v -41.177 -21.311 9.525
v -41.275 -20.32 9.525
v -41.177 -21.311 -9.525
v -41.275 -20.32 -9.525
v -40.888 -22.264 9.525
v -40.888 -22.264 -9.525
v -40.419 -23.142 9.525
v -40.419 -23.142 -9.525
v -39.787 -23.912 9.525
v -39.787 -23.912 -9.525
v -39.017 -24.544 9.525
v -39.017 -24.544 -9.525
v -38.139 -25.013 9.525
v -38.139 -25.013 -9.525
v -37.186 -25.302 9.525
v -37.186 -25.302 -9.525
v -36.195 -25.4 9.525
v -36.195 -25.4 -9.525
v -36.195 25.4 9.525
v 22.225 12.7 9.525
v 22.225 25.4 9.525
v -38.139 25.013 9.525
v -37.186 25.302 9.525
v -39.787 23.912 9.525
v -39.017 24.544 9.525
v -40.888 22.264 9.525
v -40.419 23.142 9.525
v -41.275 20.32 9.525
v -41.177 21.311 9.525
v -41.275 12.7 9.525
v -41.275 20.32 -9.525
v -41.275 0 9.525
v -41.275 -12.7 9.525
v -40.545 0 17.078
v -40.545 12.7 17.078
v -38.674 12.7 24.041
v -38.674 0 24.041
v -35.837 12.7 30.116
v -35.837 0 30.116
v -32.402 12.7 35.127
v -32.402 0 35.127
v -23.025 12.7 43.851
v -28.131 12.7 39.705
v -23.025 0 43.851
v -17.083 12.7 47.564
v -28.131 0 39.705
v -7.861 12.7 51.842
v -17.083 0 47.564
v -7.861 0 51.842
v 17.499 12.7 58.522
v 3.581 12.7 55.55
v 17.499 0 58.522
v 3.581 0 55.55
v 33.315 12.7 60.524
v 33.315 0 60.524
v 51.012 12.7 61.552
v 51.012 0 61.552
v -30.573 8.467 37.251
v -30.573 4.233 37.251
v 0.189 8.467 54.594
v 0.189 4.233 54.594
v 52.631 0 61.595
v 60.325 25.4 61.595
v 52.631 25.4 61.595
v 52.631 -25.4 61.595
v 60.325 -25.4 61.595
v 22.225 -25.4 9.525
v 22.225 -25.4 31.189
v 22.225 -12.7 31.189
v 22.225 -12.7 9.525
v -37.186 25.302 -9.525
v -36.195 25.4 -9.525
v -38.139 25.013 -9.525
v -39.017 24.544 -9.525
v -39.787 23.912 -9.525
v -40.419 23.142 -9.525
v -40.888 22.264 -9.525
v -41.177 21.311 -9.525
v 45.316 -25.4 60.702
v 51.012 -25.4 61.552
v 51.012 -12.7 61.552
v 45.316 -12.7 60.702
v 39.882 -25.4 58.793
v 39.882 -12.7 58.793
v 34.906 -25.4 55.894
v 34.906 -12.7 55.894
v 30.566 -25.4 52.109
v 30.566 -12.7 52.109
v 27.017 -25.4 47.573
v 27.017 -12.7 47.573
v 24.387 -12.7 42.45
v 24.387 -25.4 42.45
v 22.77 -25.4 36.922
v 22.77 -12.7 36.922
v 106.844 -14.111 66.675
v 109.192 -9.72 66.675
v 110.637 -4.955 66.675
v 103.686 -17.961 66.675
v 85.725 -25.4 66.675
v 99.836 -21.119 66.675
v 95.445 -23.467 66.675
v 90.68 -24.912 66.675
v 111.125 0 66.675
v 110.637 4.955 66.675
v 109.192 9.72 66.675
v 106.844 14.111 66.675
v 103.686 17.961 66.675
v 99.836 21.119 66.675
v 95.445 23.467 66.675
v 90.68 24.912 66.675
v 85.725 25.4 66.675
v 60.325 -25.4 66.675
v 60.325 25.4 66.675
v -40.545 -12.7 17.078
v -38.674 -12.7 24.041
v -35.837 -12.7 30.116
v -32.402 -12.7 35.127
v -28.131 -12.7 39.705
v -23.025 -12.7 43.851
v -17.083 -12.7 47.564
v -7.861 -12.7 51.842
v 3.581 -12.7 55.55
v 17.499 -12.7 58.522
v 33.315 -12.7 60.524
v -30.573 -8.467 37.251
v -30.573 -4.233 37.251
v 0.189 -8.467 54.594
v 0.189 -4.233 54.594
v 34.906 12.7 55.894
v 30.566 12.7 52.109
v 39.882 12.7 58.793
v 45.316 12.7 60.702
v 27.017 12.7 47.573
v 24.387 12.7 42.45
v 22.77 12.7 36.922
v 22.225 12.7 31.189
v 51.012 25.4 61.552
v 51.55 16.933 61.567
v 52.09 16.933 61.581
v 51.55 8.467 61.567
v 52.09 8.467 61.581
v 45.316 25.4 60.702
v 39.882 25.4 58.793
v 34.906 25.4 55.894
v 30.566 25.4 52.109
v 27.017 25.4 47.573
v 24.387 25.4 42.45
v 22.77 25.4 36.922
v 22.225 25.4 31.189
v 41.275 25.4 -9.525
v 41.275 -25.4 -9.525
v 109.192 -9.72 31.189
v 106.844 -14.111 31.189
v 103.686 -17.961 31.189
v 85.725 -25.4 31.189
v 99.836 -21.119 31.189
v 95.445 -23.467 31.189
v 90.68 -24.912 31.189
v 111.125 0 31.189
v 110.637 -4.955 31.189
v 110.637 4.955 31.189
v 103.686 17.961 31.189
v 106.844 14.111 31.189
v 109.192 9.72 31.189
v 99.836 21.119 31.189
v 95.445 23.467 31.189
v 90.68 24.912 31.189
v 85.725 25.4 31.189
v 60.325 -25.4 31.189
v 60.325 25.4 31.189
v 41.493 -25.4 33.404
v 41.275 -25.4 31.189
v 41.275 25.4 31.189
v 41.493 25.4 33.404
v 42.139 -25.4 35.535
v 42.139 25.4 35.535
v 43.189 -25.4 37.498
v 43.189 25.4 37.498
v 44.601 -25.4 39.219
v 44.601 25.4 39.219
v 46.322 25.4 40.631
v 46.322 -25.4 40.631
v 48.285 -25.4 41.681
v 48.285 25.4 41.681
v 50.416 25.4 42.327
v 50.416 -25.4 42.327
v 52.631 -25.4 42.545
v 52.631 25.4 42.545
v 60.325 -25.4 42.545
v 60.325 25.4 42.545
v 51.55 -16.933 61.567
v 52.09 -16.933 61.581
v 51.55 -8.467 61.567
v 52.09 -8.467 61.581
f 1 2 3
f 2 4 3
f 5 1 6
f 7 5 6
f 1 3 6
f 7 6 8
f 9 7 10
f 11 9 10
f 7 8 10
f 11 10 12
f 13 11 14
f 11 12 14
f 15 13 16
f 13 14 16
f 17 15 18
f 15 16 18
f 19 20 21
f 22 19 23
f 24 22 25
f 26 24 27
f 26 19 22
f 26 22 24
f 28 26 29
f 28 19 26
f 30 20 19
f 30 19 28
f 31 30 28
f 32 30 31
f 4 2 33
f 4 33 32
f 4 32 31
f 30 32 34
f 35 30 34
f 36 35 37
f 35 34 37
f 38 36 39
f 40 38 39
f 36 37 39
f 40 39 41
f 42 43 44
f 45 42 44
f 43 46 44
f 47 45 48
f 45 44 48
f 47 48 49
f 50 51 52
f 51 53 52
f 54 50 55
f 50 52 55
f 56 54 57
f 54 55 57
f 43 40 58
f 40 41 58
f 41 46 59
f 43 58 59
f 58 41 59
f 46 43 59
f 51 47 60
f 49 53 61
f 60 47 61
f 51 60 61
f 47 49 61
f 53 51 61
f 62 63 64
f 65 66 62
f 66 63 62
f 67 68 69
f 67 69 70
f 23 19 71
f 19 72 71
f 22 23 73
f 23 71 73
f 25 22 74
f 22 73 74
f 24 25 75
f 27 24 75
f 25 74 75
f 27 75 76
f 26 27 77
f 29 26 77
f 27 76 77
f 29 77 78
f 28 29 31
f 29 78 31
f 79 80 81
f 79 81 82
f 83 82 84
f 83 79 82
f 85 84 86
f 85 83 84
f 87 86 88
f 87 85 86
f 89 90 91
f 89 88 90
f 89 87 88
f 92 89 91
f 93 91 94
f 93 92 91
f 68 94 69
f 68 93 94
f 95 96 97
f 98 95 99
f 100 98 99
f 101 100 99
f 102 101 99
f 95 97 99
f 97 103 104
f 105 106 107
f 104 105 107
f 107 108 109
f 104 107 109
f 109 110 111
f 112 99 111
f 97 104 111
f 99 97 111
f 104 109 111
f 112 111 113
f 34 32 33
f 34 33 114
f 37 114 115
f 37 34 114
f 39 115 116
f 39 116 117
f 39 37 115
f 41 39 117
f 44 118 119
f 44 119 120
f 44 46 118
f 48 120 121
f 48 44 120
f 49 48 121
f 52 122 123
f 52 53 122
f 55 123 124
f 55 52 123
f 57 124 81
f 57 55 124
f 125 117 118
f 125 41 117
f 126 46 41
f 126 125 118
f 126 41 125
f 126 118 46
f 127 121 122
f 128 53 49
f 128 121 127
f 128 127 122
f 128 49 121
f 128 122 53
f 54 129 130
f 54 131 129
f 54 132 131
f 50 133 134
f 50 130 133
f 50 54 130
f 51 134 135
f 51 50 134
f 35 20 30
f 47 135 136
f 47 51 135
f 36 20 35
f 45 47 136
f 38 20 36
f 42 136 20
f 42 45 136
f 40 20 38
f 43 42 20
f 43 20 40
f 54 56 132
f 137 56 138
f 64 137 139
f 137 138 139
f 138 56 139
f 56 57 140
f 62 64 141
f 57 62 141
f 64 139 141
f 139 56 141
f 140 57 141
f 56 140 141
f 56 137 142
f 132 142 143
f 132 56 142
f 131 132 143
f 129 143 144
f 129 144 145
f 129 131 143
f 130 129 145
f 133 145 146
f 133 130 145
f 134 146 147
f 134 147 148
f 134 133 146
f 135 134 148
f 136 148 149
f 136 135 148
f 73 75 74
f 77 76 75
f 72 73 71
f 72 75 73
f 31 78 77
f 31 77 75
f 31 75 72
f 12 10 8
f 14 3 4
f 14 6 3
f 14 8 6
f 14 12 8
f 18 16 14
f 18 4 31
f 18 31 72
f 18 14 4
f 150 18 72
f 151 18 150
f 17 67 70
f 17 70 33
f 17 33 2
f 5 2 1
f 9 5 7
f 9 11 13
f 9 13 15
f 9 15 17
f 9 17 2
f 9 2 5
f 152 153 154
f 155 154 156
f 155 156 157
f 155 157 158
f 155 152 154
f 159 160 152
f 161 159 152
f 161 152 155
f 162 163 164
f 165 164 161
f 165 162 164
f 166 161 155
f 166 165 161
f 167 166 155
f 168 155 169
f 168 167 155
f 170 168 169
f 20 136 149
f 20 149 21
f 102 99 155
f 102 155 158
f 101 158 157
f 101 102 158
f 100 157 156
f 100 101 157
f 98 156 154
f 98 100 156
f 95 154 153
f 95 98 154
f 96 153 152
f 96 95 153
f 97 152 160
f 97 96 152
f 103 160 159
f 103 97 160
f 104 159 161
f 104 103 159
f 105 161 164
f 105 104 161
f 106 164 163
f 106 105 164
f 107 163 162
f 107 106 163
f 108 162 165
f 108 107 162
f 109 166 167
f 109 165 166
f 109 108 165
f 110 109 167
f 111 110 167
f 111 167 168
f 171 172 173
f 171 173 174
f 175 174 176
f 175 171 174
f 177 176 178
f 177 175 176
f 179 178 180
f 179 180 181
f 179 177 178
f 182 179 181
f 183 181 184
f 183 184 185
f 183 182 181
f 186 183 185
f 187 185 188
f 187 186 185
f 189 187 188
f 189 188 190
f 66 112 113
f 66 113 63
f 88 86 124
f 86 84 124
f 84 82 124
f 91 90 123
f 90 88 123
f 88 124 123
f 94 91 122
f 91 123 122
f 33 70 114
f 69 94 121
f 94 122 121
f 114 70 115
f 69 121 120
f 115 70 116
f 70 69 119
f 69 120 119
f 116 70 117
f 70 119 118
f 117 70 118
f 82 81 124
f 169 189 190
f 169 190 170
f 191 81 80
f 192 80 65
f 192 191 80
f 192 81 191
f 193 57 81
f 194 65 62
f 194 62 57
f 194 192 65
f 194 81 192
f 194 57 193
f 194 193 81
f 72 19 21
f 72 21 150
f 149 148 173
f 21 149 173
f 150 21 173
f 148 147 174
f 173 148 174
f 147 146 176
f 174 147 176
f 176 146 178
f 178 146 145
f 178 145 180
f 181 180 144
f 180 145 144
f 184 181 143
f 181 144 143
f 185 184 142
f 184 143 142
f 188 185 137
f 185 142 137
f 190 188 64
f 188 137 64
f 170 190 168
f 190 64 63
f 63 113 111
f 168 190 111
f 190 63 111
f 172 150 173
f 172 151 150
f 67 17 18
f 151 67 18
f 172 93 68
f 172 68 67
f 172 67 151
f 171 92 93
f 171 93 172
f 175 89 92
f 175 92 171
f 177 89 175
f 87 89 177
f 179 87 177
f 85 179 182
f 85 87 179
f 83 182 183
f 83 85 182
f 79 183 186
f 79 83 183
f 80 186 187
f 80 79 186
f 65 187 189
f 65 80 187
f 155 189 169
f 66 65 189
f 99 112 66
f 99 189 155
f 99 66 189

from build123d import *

# Parameters (mm, degrees)
F1_DEPTH = 25.4
F2_DEPTH = 25.4
F3_DEPTH = 12.7
F0_W     = 25.4
F0_H     = 35.486
F5_R     = 5.08


with BuildPart() as f1:
    # F0 (on Front) → F1 (new body, symmetric)
    with BuildSketch(Plane.XZ):
        Polygon((-41.275, -9.525), (41.275, -9.525), (41.275, 9.525), (22.225, 9.525), (-41.275, 9.525), align=None)
    extrude(amount=F1_DEPTH, both=True)

    # F0 (on Front) → F2 (join, symmetric)
    with BuildSketch(Plane.XZ):
        with BuildLine():
            Line((22.225, 9.525), (41.275, 9.525))
            Line((41.275, 9.525), (41.275, 31.189))
            ThreePointArc((41.275, 31.189), (44.601095, 39.218905), (52.631, 42.545))
            Line((52.631, 42.545), (60.325, 42.545))
            Line((60.325, 42.545), (60.325, 61.595))
            Line((60.325, 61.595), (52.631, 61.595))
            add(Edge.make_bspline(
                [(51.01188, 61.55186), (51.549241, 61.567455), (52.088947, 61.581835), (52.631, 61.595)],
                knots=[106.436193, 106.436193, 106.436193, 106.436193, 107.376077, 107.376077, 107.376077, 107.376077], degree=3))
            ThreePointArc((51.01188, 61.55186), (30.56569, 52.109013), (22.225, 31.189))
            Line((22.225, 31.189), (22.225, 9.525))
        make_face()
        Polygon((60.325, 61.595), (60.325, 42.545), (60.325, 31.189), (85.725, 31.189), (85.725, 66.675), (60.325, 66.675), align=None)
    extrude(amount=F2_DEPTH, both=True)

    # F0 (on Front) → F3 (join, symmetric)
    with BuildSketch(Plane.XZ):
        with BuildLine():
            add(Edge.make_bspline(
                [(-41.275, 9.525), (-40.603282, 42.443589), (-9.840989, 59.785876), (51.01188, 61.55186)],
                knots=[0, 0, 0, 0, 106.436193, 106.436193, 106.436193, 106.436193], degree=3))
            Line((-41.275, 9.525), (22.225, 9.525))
            Line((22.225, 9.525), (22.225, 31.189))
            ThreePointArc((22.225, 31.189), (30.56569, 52.109013), (51.01188, 61.55186))
        make_face()
    extrude(amount=F3_DEPTH, both=True)

    # F0 (on Front) → F4 (revolve)
    with BuildSketch(Plane.XZ):
        with Locations((98.425, 48.932)):
            Rectangle(F0_W, F0_H)
    revolve(axis=Axis((85.725, 0, 48.932), (0, 0, 1)))

    # F5
    f5_edges = [f1.edges().sort_by_distance(p)[0] for p in [
        (-41.275, -25.4, 0),
        (-41.275, 25.4, 0),
    ]]
    fillet(f5_edges, radius=F5_R)


solid = f1.part
